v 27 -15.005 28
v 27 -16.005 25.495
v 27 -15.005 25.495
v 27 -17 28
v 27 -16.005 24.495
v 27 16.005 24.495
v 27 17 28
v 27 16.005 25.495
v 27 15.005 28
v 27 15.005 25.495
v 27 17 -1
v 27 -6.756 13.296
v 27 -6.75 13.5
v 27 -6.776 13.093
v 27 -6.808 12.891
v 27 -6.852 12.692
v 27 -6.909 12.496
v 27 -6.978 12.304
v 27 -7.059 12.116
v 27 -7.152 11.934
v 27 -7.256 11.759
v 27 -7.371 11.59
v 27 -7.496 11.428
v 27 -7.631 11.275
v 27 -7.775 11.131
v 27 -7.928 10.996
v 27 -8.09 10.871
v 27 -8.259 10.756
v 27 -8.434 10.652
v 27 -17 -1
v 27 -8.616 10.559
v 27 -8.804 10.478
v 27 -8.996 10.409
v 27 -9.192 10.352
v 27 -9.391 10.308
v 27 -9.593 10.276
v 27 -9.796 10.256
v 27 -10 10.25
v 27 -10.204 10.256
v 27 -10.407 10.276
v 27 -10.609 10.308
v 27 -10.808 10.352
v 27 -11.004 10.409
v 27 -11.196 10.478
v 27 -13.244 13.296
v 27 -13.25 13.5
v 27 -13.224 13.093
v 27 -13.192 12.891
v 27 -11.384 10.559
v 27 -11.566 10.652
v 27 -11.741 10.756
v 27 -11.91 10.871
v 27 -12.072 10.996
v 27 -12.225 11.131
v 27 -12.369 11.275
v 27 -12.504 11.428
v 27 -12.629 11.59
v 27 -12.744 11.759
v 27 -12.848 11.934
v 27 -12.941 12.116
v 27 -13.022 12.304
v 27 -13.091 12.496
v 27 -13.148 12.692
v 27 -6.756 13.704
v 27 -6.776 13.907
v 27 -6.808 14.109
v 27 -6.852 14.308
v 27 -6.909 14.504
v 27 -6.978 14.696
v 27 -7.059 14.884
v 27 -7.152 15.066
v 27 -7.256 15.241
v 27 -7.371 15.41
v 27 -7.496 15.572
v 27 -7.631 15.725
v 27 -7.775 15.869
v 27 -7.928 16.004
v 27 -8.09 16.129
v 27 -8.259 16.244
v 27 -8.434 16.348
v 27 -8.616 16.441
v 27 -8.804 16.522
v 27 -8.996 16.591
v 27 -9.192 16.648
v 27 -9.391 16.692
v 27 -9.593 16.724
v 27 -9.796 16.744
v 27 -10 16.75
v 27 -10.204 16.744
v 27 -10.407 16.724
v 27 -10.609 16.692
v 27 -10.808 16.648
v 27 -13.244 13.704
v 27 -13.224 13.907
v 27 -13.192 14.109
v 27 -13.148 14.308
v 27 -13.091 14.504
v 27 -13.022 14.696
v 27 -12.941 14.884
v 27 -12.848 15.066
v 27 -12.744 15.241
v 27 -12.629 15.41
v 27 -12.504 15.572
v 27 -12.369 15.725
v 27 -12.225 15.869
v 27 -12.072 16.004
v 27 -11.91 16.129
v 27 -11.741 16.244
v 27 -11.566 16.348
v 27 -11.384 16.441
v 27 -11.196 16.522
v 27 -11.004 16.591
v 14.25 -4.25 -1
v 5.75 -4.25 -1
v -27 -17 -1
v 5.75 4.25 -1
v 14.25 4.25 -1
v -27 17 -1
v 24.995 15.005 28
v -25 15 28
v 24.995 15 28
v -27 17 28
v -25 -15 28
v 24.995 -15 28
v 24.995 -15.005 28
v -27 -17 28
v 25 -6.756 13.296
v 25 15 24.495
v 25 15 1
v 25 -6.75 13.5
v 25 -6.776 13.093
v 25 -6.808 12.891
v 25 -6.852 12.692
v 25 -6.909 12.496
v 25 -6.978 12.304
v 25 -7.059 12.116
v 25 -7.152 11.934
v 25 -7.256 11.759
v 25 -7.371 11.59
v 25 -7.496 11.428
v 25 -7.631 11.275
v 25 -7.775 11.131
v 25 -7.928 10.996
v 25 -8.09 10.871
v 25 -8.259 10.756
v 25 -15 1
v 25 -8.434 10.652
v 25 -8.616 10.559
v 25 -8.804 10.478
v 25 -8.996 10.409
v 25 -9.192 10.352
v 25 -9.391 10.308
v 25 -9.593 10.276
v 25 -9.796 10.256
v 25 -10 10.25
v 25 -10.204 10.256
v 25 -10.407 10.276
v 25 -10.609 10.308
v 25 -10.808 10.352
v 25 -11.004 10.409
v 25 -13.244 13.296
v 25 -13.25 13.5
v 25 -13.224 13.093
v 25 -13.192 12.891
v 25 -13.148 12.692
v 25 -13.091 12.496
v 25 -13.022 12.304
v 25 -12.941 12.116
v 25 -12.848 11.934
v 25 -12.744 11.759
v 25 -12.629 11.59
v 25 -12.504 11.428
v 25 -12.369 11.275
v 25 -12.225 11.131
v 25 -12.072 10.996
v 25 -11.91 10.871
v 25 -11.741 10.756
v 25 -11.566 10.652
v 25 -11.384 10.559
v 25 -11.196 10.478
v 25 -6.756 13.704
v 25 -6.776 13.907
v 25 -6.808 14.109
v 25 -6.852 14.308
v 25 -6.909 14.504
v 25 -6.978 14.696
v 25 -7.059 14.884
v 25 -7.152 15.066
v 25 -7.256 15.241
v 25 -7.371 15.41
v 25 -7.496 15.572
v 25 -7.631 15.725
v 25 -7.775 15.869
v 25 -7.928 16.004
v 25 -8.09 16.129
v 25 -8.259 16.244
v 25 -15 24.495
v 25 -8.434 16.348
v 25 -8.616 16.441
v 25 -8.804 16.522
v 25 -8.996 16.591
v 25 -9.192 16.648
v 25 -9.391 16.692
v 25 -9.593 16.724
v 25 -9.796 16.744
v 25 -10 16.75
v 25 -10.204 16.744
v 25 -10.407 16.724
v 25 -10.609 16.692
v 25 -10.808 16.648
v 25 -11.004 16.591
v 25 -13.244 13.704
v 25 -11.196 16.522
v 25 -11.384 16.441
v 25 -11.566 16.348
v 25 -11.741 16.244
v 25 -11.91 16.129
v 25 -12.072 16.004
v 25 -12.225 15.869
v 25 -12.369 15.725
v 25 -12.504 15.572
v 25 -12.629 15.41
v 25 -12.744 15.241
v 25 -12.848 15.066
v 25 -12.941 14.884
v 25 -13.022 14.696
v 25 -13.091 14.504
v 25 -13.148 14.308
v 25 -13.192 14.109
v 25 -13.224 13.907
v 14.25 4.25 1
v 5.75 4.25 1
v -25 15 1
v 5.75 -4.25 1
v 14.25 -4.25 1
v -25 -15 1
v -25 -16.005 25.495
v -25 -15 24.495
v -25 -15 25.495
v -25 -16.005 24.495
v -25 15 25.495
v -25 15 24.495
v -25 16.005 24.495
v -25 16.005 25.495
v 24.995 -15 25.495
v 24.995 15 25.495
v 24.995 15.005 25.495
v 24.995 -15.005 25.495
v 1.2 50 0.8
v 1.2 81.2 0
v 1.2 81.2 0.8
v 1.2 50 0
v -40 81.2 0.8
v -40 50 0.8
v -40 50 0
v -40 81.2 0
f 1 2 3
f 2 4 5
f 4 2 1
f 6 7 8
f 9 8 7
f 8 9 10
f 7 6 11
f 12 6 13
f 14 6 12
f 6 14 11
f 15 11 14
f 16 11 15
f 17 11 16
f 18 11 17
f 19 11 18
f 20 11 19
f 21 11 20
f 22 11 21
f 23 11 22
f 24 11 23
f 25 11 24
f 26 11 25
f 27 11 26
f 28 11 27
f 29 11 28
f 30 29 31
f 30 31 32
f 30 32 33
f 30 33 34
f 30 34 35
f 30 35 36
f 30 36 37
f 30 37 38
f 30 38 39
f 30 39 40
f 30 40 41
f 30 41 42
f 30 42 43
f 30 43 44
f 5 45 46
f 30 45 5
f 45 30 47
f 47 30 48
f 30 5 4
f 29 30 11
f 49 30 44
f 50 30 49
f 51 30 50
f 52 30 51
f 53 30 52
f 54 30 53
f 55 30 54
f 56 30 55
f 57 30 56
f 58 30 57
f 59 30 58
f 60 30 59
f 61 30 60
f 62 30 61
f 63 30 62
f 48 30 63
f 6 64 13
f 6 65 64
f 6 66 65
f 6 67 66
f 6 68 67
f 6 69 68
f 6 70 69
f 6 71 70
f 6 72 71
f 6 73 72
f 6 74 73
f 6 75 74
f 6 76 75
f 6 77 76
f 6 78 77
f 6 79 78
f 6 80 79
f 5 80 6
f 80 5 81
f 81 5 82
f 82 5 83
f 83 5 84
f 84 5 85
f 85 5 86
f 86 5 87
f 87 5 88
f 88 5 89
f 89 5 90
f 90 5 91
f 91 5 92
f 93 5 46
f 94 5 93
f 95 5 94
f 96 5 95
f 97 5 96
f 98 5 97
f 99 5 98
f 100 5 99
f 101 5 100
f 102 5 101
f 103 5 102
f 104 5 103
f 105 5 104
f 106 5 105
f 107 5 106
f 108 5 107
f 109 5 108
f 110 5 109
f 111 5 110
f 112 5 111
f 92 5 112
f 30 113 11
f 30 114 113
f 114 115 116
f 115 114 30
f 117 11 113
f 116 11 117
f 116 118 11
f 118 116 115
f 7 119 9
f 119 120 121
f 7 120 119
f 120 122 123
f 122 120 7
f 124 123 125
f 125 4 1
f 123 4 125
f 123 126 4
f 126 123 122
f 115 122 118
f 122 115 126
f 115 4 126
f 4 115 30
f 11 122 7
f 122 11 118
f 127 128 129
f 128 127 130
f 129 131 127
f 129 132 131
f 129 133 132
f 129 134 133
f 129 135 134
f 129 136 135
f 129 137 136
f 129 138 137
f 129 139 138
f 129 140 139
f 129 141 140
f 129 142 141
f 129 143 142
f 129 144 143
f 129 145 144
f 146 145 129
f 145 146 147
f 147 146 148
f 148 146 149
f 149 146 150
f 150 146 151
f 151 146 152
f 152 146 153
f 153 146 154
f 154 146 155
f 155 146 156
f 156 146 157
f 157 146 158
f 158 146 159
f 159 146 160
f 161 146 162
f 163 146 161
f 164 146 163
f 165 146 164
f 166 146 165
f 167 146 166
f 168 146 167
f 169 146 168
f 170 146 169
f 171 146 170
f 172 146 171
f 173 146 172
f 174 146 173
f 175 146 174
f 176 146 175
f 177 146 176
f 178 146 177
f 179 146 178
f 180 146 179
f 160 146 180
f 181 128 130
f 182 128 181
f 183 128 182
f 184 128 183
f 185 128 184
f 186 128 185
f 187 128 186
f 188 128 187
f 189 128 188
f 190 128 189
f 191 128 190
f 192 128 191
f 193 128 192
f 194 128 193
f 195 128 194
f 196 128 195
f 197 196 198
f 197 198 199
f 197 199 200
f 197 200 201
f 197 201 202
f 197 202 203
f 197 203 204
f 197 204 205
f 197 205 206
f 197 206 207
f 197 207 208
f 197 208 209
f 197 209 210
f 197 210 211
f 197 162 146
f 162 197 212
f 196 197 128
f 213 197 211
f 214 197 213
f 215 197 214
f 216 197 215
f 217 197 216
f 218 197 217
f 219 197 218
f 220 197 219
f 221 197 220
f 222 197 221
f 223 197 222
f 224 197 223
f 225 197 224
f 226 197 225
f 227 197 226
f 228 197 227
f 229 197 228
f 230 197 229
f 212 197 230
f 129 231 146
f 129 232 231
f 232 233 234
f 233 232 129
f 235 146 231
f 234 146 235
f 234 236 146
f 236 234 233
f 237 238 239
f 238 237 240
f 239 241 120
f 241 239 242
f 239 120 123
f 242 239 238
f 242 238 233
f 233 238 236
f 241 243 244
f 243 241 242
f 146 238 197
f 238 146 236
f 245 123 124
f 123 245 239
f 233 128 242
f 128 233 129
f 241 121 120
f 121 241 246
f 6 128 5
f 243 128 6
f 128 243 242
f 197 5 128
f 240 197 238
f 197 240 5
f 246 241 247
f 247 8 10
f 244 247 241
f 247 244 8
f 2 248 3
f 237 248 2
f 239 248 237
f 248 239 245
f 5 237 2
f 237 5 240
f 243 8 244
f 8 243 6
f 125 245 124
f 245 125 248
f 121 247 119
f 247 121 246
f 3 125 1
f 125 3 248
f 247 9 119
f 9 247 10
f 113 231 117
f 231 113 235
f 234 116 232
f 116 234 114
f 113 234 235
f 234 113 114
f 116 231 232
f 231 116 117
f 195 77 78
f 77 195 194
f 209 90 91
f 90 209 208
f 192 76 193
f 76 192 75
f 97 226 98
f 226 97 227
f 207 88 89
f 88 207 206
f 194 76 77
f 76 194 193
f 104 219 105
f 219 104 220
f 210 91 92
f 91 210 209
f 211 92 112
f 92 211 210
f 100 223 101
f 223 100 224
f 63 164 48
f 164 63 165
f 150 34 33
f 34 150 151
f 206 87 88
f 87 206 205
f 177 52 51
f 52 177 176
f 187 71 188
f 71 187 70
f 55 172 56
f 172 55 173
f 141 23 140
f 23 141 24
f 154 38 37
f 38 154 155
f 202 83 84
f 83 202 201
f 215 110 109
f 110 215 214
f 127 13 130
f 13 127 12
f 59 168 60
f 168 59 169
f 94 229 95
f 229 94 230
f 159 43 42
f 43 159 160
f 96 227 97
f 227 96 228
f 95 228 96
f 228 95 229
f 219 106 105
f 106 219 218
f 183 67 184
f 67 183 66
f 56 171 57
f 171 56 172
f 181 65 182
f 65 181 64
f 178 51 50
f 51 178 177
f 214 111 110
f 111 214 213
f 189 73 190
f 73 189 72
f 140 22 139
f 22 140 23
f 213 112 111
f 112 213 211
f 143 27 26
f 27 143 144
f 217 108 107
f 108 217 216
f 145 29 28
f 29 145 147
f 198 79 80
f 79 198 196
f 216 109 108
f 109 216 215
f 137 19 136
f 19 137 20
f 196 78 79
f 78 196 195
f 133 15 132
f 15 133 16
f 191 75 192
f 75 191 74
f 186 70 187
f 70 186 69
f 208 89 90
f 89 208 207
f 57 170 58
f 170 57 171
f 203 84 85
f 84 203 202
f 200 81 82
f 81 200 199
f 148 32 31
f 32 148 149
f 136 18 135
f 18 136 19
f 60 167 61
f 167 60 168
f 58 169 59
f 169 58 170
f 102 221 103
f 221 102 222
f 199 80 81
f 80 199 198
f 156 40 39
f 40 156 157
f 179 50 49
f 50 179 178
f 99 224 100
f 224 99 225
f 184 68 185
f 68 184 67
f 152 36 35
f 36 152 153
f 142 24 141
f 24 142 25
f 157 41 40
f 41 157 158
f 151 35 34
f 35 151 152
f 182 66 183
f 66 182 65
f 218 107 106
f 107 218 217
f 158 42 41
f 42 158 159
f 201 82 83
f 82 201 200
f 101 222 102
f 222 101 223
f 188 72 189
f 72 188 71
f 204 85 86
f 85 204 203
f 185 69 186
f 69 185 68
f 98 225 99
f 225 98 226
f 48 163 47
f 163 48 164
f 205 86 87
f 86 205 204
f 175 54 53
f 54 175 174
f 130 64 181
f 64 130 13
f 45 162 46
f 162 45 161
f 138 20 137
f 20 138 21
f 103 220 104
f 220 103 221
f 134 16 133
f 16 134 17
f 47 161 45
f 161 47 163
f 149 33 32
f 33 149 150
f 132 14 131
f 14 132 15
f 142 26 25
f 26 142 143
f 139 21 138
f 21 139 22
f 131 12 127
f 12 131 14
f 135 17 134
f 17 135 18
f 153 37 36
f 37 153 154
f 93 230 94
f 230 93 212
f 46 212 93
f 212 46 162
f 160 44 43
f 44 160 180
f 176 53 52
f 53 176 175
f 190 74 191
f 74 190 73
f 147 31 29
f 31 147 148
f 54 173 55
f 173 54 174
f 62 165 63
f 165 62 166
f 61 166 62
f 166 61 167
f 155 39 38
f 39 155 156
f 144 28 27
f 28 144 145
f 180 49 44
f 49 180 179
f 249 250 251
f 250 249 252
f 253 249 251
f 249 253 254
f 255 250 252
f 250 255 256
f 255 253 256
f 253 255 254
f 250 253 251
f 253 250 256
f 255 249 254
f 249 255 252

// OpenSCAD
total_size = [ 50, 30, 25 ];
wall_depth = [ 2, 2, 2 ];
screen_hole_size = [24, 36, 10];
slider_gap_depth = 1;
epsilon = 0.01;
margin = 0.8;

module case(with_antenna_hole=false) {
    $fn=100;

    // cube body
    translate([0, 0, (total_size[2] + wall_depth[2]) / 2])
    rotate([180, 0, 0])
    difference() {
        cube(total_size + wall_depth * 2, center=true);
        // center hole
        cube(total_size, center=true);
        // slider gap
        translate([ wall_depth[0] / 2 + epsilon / 2, 0, -total_size[2] / 2 + wall_depth[2] / 2 + epsilon / 2 ])
        cube([ total_size[0] + wall_depth[0] + epsilon, total_size[1] + 2 * slider_gap_depth + epsilon, slider_gap_depth ], center=true);
        // remove the bottom 
        translate([ 0, 0, -total_size[2] / 2 - wall_depth[2] / 2 - epsilon ])
        cube([ total_size[0], total_size[1], wall_depth[2] + 3 * epsilon], center=true);
        // remove the edge which might cause the bridging issue
        translate([ total_size[0] / 2 + wall_depth[0] / 2 + epsilon / 2, 0, -total_size[2] / 2 - wall_depth[2] / 2 - epsilon ])
        cube([ wall_depth[0] + 2 * epsilon, total_size[1] + epsilon, wall_depth[2] * 2 + 3 * epsilon], center=true);
        // remove the hole for the micro USB
        // translate([-total_size[0] / 2, 0, -5])
        // cube([10, 13, 7], center=true);
        // remove the hole for the camera
        translate([10, 0, (total_size[2] + wall_depth[2]) / 2]) 
        // cylinder(r=8/2, h=10, center=true);
        cube([8.5, 8.5, 10], center=true);

        if (with_antenna_hole) {
            translate([total_size[0]/2, total_size[1]/2-5, 0])
            rotate([0, 90, 0])
            cylinder(r=6.5/2, h=10, center=true);
        }
    }
}

module slider() {
    // slider
    translate([ -40, 50, 0 ])
    cube([ total_size[0] + wall_depth[0] - margin - 10, total_size[1] + 2 * slider_gap_depth - margin, slider_gap_depth - 0.2 ]);
}

case(true);
slider();
